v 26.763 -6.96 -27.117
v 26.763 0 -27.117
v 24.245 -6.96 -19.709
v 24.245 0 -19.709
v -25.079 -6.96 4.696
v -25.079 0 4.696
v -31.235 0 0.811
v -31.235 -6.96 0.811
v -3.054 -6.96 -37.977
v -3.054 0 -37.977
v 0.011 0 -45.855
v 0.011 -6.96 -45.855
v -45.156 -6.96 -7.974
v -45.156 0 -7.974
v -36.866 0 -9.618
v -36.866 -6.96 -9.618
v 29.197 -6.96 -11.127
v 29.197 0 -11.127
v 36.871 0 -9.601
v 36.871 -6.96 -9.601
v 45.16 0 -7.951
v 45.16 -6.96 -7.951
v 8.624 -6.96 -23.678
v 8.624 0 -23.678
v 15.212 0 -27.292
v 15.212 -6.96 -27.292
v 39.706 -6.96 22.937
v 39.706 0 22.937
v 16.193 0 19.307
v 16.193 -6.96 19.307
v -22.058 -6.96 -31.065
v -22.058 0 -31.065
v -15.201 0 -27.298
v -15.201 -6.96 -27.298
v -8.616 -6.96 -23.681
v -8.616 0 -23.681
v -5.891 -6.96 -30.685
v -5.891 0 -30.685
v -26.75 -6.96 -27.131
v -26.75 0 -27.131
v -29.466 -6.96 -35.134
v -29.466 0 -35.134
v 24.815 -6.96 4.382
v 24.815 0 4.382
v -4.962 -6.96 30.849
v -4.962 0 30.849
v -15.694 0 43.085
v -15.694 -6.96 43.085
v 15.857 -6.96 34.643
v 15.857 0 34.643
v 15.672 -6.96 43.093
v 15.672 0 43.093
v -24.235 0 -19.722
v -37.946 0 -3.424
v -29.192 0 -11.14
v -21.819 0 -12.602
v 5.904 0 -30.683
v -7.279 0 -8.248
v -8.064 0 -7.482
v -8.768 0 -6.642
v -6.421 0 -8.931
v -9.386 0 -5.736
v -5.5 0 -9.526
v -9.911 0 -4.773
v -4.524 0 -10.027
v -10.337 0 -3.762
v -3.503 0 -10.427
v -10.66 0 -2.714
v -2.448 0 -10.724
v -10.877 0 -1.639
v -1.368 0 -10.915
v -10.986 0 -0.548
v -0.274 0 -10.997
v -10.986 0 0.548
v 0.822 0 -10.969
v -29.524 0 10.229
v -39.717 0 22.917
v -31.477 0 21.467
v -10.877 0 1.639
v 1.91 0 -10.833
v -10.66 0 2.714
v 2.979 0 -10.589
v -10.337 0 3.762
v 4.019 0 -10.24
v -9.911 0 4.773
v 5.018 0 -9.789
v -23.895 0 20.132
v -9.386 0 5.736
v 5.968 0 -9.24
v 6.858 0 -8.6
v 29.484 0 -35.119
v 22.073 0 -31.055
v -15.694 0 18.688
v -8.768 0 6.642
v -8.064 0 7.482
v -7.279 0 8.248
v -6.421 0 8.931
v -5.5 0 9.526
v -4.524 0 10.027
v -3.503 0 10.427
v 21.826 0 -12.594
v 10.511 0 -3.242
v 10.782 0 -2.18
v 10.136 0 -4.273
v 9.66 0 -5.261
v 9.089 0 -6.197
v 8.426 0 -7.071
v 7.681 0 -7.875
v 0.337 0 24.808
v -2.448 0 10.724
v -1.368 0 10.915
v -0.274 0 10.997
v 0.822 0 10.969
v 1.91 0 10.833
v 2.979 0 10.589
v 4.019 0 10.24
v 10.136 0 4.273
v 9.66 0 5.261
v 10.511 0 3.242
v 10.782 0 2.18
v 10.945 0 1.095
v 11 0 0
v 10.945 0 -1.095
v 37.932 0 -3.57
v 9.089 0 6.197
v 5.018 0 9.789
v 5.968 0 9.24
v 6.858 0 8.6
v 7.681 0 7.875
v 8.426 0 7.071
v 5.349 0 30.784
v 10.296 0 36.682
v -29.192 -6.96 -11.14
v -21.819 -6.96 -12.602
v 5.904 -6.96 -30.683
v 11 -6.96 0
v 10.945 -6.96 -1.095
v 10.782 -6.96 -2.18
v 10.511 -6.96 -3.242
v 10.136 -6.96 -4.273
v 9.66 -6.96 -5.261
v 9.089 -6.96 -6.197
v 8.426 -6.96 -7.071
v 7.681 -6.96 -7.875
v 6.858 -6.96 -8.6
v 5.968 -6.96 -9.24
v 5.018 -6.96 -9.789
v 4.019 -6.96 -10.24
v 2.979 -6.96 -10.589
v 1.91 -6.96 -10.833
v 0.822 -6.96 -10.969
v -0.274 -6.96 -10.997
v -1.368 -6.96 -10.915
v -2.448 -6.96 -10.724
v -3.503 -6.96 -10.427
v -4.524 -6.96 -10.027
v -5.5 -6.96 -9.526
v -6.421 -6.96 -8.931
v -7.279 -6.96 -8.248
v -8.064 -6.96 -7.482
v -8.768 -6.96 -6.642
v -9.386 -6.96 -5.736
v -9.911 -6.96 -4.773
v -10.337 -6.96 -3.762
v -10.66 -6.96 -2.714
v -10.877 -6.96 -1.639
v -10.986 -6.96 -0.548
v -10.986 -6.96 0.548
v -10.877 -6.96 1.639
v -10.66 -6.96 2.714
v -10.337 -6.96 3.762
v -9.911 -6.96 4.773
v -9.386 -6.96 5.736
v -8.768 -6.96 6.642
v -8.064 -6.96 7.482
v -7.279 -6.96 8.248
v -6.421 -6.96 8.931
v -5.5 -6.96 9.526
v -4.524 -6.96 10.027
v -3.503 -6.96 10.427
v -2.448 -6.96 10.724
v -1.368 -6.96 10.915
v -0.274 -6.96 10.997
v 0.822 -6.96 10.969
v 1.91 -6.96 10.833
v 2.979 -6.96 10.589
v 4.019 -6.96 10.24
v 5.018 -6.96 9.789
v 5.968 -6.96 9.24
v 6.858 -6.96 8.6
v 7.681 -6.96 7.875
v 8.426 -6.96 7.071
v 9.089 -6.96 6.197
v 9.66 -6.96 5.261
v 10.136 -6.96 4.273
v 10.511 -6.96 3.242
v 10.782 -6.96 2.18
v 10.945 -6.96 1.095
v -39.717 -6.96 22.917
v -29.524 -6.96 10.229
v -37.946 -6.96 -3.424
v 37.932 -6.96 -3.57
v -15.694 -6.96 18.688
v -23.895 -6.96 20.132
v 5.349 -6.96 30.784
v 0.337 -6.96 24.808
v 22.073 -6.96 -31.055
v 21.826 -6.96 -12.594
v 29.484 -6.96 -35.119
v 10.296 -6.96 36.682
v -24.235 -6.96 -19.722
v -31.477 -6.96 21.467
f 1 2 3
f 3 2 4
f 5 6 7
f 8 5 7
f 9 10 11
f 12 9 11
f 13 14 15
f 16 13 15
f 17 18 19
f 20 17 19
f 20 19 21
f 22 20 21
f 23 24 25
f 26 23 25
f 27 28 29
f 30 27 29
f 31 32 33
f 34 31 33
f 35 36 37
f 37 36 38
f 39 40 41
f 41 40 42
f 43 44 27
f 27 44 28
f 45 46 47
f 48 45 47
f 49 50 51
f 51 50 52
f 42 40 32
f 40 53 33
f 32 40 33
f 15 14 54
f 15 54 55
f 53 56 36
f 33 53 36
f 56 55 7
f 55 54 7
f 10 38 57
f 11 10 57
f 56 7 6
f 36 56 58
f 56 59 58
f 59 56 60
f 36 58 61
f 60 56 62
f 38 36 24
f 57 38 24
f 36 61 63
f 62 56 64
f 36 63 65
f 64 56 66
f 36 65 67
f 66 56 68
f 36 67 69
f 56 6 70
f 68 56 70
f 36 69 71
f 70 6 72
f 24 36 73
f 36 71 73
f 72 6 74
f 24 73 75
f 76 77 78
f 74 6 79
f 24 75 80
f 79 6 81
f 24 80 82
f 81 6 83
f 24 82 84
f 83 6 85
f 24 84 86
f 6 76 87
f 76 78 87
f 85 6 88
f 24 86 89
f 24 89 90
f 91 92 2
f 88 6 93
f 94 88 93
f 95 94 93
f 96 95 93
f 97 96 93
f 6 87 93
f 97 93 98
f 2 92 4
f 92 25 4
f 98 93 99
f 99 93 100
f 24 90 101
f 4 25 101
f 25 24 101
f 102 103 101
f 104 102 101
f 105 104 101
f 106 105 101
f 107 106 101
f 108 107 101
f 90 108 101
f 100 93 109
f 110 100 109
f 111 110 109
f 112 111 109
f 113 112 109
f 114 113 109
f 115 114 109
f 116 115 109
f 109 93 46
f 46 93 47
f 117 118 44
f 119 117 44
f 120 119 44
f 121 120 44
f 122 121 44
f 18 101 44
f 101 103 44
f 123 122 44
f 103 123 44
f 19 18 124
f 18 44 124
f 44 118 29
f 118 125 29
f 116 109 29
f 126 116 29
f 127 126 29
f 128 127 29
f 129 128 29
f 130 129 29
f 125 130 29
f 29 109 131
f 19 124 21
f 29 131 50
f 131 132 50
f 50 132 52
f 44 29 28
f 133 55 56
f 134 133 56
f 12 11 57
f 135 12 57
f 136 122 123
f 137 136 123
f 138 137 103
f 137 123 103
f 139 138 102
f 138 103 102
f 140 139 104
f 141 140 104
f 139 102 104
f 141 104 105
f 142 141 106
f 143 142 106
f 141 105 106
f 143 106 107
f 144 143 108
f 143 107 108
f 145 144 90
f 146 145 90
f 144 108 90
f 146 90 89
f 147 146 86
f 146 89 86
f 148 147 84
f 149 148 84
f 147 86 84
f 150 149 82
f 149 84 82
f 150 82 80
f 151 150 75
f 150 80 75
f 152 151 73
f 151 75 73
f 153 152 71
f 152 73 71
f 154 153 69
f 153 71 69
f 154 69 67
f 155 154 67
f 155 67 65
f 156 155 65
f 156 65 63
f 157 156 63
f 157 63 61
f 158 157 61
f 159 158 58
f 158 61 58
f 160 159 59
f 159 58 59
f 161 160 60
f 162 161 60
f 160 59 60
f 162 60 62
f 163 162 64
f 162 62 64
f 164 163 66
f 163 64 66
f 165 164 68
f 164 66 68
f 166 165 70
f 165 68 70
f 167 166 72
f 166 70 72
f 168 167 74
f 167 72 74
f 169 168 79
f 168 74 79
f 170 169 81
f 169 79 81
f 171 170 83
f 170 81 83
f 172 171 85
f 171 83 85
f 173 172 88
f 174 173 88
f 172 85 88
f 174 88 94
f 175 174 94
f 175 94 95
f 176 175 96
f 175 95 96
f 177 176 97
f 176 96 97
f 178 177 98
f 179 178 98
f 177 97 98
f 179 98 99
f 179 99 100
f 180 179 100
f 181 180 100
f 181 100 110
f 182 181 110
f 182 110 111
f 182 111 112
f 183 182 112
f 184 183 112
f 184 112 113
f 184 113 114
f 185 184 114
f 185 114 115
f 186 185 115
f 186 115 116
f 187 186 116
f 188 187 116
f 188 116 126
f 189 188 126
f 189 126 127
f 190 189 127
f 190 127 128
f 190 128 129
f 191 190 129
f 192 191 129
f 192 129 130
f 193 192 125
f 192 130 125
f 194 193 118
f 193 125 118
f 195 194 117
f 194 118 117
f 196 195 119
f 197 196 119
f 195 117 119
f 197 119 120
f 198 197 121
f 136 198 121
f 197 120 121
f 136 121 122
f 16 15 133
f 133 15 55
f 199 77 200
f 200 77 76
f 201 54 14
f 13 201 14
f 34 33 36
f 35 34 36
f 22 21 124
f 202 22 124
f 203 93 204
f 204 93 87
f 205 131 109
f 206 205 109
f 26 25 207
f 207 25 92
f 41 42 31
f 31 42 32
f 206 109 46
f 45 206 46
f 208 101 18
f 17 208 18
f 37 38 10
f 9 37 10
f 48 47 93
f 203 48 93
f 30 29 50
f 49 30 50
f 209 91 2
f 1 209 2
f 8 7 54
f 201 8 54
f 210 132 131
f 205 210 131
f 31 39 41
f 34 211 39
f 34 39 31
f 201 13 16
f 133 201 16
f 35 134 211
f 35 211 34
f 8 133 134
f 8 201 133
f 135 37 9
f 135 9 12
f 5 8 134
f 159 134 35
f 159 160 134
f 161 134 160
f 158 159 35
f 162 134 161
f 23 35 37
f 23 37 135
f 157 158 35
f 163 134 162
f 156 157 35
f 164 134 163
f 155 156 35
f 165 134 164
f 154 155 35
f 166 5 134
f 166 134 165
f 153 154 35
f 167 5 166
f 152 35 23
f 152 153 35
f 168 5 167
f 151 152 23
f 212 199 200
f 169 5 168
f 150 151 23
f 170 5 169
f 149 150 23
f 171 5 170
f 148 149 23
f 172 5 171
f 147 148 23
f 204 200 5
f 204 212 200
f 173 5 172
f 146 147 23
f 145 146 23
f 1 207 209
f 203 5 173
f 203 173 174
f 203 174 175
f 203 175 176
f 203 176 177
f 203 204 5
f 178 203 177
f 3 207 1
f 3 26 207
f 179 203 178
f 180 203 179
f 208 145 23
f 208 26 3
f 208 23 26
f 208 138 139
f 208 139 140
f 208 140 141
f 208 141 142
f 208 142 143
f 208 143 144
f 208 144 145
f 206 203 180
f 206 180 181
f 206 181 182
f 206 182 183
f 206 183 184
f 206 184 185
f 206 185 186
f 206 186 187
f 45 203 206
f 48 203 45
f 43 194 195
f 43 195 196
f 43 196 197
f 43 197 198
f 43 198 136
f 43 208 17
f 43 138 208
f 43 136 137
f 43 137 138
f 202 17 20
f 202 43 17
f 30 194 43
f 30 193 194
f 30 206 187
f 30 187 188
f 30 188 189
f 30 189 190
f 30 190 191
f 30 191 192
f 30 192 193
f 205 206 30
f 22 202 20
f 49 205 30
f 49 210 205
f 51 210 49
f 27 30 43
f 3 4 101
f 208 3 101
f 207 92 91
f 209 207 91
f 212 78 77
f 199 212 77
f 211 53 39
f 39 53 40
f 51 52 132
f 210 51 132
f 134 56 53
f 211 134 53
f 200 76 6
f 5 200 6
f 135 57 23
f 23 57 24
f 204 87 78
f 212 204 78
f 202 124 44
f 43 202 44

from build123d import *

# Parameters (mm, degrees)
F1_DEPTH = 6.96


# Not quite as in the source:
# - a feature of the source that left no trace in its solid (it failed there, or was rolled back) is left out
# - a feature names something its author has since deleted; it is built from what else it names


with BuildPart() as f1:
    # F0 (on Front) → F1 (new body)
    with BuildSketch(Plane.XZ):
        with BuildLine():
            Line((-4.9618439889, 30.8489073878), (-10.120921757, 36.7311440441))
            ThreePointArc((-10.120921757, 36.7311440441), (-12.9466687362, 35.832858784), (-15.6940034453, 34.7175496811))
            Line((-15.6940034453, 34.7175496811), (-15.6940034453, 27.0180169266))
            ThreePointArc((-15.6940034453, 27.0180169266), (-10.5040439231, 29.4268592285), (-4.9618439889, 30.8489073878))
        make_face()
        with BuildLine():
            ThreePointArc((-15.6940034453, 34.7175496811), (-12.9466687362, 35.832858784), (-10.120921757, 36.7311440441))
            Line((-10.120921757, 36.7311440441), (-15.6940034453, 43.0854164294))
            Line((-15.6940034453, 43.0854164294), (-15.6940034453, 34.7175496811))
        make_face()
        with BuildLine():
            Line((0.3367577987, 24.8075893339), (-4.9618439889, 30.8489073878))
            ThreePointArc((-4.9618439889, 30.8489073878), (-10.5040439231, 29.4268592285), (-15.6940034453, 27.0180169266))
            Line((-15.6940034453, 27.0180169266), (-15.6940034453, 18.6877066835))
            Line((-15.6940034453, 18.6877066835), (-6.1980460207, 17.0157598588))
            Line((-6.1980460207, 17.0157598588), (0.3367577987, 24.8075893339))
        make_face()
        with BuildLine():
            Line((5.349116457, 30.7841182417), (0.3367577987, 24.8075893339))
            Line((0.3367577987, 24.8075893339), (-6.1980460207, 17.0157598588))
            Line((-6.1980460207, 17.0157598588), (-15.6940034453, 18.6877066835))
            Line((-15.6940034453, 18.6877066835), (-15.6940034453, 10.6181583146))
            Line((-15.6940034453, 10.6181583146), (-25.0790561702, 4.6957263488))
            Line((-25.0790561702, 4.6957263488), (-18.6598426779, -3.2950419376))
            Line((-18.6598426779, -3.2950419376), (-21.8185465433, -12.6017368372))
            Line((-21.8185465433, -12.6017368372), (-12.1835113634, -14.5123768209))
            Line((-12.1835113634, -14.5123768209), (-8.6159947437, -23.6812639315))
            Line((-8.6159947437, -23.6812639315), (0, -18.9485363587))
            Line((0, -18.9485363587), (8.6238023794, -23.6784231328))
            Line((8.6238023794, -23.6784231328), (12.1835113634, -14.5123768209))
            Line((12.1835113634, -14.5123768209), (21.8258896669, -12.5939120432))
            Line((21.8258896669, -12.5939120432), (18.6614871852, -3.2857154732))
            Line((18.6614871852, -3.2857154732), (24.8148121143, 4.3819151105))
            Line((24.8148121143, 4.3819151105), (29.5186280009, 10.2433189804))
            Line((29.5186280009, 10.2433189804), (34.4156358122, 16.3454584408))
            Line((34.4156358122, 16.3454584408), (39.7056170429, 22.9372803158))
            Line((39.7056170429, 22.9372803158), (16.1926081875, 19.3073954844))
            Line((16.1926081875, 19.3073954844), (15.85724841, 34.6432918884))
            ThreePointArc((15.85724841, 34.6432918884), (14.4513233415, 35.2529325543), (13.0220201926, 35.8055441252))
            Line((13.0220201926, 35.8055441252), (10.6792184181, 29.3637408511))
            ThreePointArc((10.6792184181, 29.3637408511), (8.0455731741, 30.1917825756), (5.349116457, 30.7841182417))
        make_face()
        with BuildLine():
            ThreePointArc((3.7596383758, 10.3375586713), (9.0098840762, 6.3104666177), (11, 0))
            ThreePointArc((11, 0), (-9.0098840762, -6.3104666177), (3.7596383758, 10.3375586713))
        make_face(mode=Mode.SUBTRACT)
        with BuildLine():
            Line((-15.6940034453, 10.6181583146), (-15.6940034453, 18.6877066835))
            Line((-15.6940034453, 18.6877066835), (-23.8953753875, 20.1317167147))
            ThreePointArc((-23.8953753875, 20.1317167147), (-27.1646586752, 15.4387921111), (-29.52374385, 10.2285645068))
            Line((-29.52374385, 10.2285645068), (-25.0790561702, 4.6957263488))
            Line((-25.0790561702, 4.6957263488), (-15.6940034453, 10.6181583146))
        make_face()
        with BuildLine():
            Line((10.2959158336, 36.6824769767), (5.349116457, 30.7841182417))
            ThreePointArc((5.349116457, 30.7841182417), (8.0455731741, 30.1917825756), (10.6792184181, 29.3637408511))
            Line((10.6792184181, 29.3637408511), (13.0220201926, 35.8055441252))
            ThreePointArc((13.0220201926, 35.8055441252), (11.6672099465, 36.2696320916), (10.2959158336, 36.6824769767))
        make_face()
        with BuildLine():
            ThreePointArc((-29.52374385, 10.2285645068), (-27.1646586752, 15.4387921111), (-23.8953753875, 20.1317167147))
            Line((-23.8953753875, 20.1317167147), (-31.476903581, 21.4665912747))
            Line((-31.476903581, 21.4665912747), (-39.7170759686, 22.9174328742))
            Line((-39.7170759686, 22.9174328742), (-29.52374385, 10.2285645068))
        make_face()
        with BuildLine():
            Line((15.6724677094, 43.0932547963), (10.2959158336, 36.6824769767))
            ThreePointArc((10.2959158336, 36.6824769767), (11.6672099465, 36.2696320916), (13.0220201926, 35.8055441252))
            Line((13.0220201926, 35.8055441252), (15.6724677094, 43.0932547963))
        make_face()
        with BuildLine():
            Line((-18.6598426779, -3.2950419376), (-25.0790561702, 4.6957263488))
            Line((-25.0790561702, 4.6957263488), (-31.2348698324, 0.8111037816))
            ThreePointArc((-31.2348698324, 0.8111037816), (-30.7987467244, -5.2642362214), (-29.1922235992, -11.139527105))
            Line((-29.1922235992, -11.139527105), (-21.8185465433, -12.6017368372))
            Line((-21.8185465433, -12.6017368372), (-18.6598426779, -3.2950419376))
        make_face()
        with BuildLine():
            Line((15.85724841, 34.6432918884), (15.6724677094, 43.0932547963))
            Line((15.6724677094, 43.0932547963), (13.0220201926, 35.8055441252))
            ThreePointArc((13.0220201926, 35.8055441252), (14.4513233415, 35.2529325543), (15.85724841, 34.6432918884))
        make_face()
        with BuildLine():
            ThreePointArc((-29.1922235992, -11.139527105), (-30.7987467244, -5.2642362214), (-31.2348698324, 0.8111037816))
            Line((-31.2348698324, 0.8111037816), (-37.9458459601, -3.4238537307))
            ThreePointArc((-37.9458459601, -3.4238537307), (-37.5339500378, -6.54313339), (-36.8660833418, -9.6177907563))
            Line((-36.8660833418, -9.6177907563), (-29.1922235992, -11.139527105))
        make_face()
        with BuildLine():
            Line((-12.1835113634, -14.5123768209), (-21.8185465433, -12.6017368372))
            Line((-21.8185465433, -12.6017368372), (-24.2350154824, -19.7215366379))
            ThreePointArc((-24.2350154824, -19.7215366379), (-20.078672611, -23.9399642642), (-15.2010519849, -27.2984065715))
            Line((-15.2010519849, -27.2984065715), (-8.6159947437, -23.6812639315))
            Line((-8.6159947437, -23.6812639315), (-12.1835113634, -14.5123768209))
        make_face()
        with BuildLine():
            ThreePointArc((-36.8660833418, -9.6177907563), (-37.5339500378, -6.54313339), (-37.9458459601, -3.4238537307))
            Line((-37.9458459601, -3.4238537307), (-45.15608724, -7.9738722218))
            Line((-45.15608724, -7.9738722218), (-36.8660833418, -9.6177907563))
        make_face()
        with BuildLine():
            ThreePointArc((-15.2010519849, -27.2984065715), (-20.078672611, -23.9399642642), (-24.2350154824, -19.7215366379))
            Line((-24.2350154824, -19.7215366379), (-26.7496429738, -27.1305473733))
            ThreePointArc((-26.7496429738, -27.1305473733), (-24.4831574997, -29.1922078446), (-22.0583421712, -31.0650855569))
            Line((-22.0583421712, -31.0650855569), (-15.2010519849, -27.2984065715))
        make_face()
        with BuildLine():
            ThreePointArc((-22.0583421712, -31.0650855569), (-24.4831574997, -29.1922078446), (-26.7496429738, -27.1305473733))
            Line((-26.7496429738, -27.1305473733), (-29.4660634378, -35.1341138854))
            Line((-29.4660634378, -35.1341138854), (-22.0583421712, -31.0650855569))
        make_face()
        with BuildLine():
            Line((0, -18.9485363587), (-8.6159947437, -23.6812639315))
            Line((-8.6159947437, -23.6812639315), (-5.8908957162, -30.6850506021))
            ThreePointArc((-5.8908957162, -30.6850506021), (0.0065066962, -31.2453987085), (5.9036752179, -30.6825944423))
            Line((5.9036752179, -30.6825944423), (8.6238023794, -23.6784231328))
            Line((8.6238023794, -23.6784231328), (0, -18.9485363587))
        make_face()
        with BuildLine():
            ThreePointArc((5.9036752179, -30.6825944423), (0.0065066962, -31.2453987085), (-5.8908957162, -30.6850506021))
            Line((-5.8908957162, -30.6850506021), (-3.0535035766, -37.9774421981))
            Line((-3.0535035766, -37.9774421981), (0.0114589257, -45.8547131899))
            Line((0.0114589257, -45.8547131899), (5.9036752179, -30.6825944423))
        make_face()
        with BuildLine():
            Line((12.1835113634, -14.5123768209), (8.6238023794, -23.6784231328))
            Line((8.6238023794, -23.6784231328), (15.2124188317, -27.2920738691))
            ThreePointArc((15.2124188317, -27.2920738691), (20.0896378001, -23.930763378), (24.2448691352, -19.7094216914))
            Line((24.2448691352, -19.7094216914), (21.8258896669, -12.5939120432))
            Line((21.8258896669, -12.5939120432), (12.1835113634, -14.5123768209))
        make_face()
        with BuildLine():
            Line((31.2416193325, 0.4860085148), (24.8148121143, 4.3819151105))
            Line((24.8148121143, 4.3819151105), (18.6614871852, -3.2857154732))
            Line((18.6614871852, -3.2857154732), (21.8258896669, -12.5939120432))
            Line((21.8258896669, -12.5939120432), (29.1968594713, -11.1273707499))
            ThreePointArc((29.1968594713, -11.1273707499), (30.7720664648, -5.418017006), (31.2416193325, 0.4860085148))
        make_face()
        with BuildLine():
            ThreePointArc((24.2448691352, -19.7094216914), (20.0896378001, -23.930763378), (15.2124188317, -27.2920738691))
            Line((15.2124188317, -27.2920738691), (22.0728280834, -31.0547944833))
            ThreePointArc((22.0728280834, -31.0547944833), (24.4972570827, -29.1803768897), (26.7631992818, -27.117174709))
            Line((26.7631992818, -27.117174709), (24.2448691352, -19.7094216914))
        make_face()
        with BuildLine():
            Line((37.9323840026, -3.569908105), (31.2416193325, 0.4860085148))
            ThreePointArc((31.2416193325, 0.4860085148), (30.7720664648, -5.418017006), (29.1968594713, -11.1273707499))
            Line((29.1968594713, -11.1273707499), (36.8705647308, -9.6005966708))
            ThreePointArc((36.8705647308, -9.6005966708), (37.5228275313, -6.6066189578), (37.9323840026, -3.569908105))
        make_face()
        with BuildLine():
            ThreePointArc((26.7631992818, -27.117174709), (24.4972570827, -29.1803768897), (22.0728280834, -31.0547944833))
            Line((22.0728280834, -31.0547944833), (29.4836195306, -35.1193825745))
            Line((29.4836195306, -35.1193825745), (26.7631992818, -27.117174709))
        make_face()
        with BuildLine():
            Line((45.1600668832, -7.951302544), (37.9323840026, -3.569908105))
            ThreePointArc((37.9323840026, -3.569908105), (37.5228275313, -6.6066189578), (36.8705647308, -9.6005966708))
            Line((36.8705647308, -9.6005966708), (45.1600668832, -7.951302544))
        make_face()
    extrude(amount=F1_DEPTH)


solid = f1.part
